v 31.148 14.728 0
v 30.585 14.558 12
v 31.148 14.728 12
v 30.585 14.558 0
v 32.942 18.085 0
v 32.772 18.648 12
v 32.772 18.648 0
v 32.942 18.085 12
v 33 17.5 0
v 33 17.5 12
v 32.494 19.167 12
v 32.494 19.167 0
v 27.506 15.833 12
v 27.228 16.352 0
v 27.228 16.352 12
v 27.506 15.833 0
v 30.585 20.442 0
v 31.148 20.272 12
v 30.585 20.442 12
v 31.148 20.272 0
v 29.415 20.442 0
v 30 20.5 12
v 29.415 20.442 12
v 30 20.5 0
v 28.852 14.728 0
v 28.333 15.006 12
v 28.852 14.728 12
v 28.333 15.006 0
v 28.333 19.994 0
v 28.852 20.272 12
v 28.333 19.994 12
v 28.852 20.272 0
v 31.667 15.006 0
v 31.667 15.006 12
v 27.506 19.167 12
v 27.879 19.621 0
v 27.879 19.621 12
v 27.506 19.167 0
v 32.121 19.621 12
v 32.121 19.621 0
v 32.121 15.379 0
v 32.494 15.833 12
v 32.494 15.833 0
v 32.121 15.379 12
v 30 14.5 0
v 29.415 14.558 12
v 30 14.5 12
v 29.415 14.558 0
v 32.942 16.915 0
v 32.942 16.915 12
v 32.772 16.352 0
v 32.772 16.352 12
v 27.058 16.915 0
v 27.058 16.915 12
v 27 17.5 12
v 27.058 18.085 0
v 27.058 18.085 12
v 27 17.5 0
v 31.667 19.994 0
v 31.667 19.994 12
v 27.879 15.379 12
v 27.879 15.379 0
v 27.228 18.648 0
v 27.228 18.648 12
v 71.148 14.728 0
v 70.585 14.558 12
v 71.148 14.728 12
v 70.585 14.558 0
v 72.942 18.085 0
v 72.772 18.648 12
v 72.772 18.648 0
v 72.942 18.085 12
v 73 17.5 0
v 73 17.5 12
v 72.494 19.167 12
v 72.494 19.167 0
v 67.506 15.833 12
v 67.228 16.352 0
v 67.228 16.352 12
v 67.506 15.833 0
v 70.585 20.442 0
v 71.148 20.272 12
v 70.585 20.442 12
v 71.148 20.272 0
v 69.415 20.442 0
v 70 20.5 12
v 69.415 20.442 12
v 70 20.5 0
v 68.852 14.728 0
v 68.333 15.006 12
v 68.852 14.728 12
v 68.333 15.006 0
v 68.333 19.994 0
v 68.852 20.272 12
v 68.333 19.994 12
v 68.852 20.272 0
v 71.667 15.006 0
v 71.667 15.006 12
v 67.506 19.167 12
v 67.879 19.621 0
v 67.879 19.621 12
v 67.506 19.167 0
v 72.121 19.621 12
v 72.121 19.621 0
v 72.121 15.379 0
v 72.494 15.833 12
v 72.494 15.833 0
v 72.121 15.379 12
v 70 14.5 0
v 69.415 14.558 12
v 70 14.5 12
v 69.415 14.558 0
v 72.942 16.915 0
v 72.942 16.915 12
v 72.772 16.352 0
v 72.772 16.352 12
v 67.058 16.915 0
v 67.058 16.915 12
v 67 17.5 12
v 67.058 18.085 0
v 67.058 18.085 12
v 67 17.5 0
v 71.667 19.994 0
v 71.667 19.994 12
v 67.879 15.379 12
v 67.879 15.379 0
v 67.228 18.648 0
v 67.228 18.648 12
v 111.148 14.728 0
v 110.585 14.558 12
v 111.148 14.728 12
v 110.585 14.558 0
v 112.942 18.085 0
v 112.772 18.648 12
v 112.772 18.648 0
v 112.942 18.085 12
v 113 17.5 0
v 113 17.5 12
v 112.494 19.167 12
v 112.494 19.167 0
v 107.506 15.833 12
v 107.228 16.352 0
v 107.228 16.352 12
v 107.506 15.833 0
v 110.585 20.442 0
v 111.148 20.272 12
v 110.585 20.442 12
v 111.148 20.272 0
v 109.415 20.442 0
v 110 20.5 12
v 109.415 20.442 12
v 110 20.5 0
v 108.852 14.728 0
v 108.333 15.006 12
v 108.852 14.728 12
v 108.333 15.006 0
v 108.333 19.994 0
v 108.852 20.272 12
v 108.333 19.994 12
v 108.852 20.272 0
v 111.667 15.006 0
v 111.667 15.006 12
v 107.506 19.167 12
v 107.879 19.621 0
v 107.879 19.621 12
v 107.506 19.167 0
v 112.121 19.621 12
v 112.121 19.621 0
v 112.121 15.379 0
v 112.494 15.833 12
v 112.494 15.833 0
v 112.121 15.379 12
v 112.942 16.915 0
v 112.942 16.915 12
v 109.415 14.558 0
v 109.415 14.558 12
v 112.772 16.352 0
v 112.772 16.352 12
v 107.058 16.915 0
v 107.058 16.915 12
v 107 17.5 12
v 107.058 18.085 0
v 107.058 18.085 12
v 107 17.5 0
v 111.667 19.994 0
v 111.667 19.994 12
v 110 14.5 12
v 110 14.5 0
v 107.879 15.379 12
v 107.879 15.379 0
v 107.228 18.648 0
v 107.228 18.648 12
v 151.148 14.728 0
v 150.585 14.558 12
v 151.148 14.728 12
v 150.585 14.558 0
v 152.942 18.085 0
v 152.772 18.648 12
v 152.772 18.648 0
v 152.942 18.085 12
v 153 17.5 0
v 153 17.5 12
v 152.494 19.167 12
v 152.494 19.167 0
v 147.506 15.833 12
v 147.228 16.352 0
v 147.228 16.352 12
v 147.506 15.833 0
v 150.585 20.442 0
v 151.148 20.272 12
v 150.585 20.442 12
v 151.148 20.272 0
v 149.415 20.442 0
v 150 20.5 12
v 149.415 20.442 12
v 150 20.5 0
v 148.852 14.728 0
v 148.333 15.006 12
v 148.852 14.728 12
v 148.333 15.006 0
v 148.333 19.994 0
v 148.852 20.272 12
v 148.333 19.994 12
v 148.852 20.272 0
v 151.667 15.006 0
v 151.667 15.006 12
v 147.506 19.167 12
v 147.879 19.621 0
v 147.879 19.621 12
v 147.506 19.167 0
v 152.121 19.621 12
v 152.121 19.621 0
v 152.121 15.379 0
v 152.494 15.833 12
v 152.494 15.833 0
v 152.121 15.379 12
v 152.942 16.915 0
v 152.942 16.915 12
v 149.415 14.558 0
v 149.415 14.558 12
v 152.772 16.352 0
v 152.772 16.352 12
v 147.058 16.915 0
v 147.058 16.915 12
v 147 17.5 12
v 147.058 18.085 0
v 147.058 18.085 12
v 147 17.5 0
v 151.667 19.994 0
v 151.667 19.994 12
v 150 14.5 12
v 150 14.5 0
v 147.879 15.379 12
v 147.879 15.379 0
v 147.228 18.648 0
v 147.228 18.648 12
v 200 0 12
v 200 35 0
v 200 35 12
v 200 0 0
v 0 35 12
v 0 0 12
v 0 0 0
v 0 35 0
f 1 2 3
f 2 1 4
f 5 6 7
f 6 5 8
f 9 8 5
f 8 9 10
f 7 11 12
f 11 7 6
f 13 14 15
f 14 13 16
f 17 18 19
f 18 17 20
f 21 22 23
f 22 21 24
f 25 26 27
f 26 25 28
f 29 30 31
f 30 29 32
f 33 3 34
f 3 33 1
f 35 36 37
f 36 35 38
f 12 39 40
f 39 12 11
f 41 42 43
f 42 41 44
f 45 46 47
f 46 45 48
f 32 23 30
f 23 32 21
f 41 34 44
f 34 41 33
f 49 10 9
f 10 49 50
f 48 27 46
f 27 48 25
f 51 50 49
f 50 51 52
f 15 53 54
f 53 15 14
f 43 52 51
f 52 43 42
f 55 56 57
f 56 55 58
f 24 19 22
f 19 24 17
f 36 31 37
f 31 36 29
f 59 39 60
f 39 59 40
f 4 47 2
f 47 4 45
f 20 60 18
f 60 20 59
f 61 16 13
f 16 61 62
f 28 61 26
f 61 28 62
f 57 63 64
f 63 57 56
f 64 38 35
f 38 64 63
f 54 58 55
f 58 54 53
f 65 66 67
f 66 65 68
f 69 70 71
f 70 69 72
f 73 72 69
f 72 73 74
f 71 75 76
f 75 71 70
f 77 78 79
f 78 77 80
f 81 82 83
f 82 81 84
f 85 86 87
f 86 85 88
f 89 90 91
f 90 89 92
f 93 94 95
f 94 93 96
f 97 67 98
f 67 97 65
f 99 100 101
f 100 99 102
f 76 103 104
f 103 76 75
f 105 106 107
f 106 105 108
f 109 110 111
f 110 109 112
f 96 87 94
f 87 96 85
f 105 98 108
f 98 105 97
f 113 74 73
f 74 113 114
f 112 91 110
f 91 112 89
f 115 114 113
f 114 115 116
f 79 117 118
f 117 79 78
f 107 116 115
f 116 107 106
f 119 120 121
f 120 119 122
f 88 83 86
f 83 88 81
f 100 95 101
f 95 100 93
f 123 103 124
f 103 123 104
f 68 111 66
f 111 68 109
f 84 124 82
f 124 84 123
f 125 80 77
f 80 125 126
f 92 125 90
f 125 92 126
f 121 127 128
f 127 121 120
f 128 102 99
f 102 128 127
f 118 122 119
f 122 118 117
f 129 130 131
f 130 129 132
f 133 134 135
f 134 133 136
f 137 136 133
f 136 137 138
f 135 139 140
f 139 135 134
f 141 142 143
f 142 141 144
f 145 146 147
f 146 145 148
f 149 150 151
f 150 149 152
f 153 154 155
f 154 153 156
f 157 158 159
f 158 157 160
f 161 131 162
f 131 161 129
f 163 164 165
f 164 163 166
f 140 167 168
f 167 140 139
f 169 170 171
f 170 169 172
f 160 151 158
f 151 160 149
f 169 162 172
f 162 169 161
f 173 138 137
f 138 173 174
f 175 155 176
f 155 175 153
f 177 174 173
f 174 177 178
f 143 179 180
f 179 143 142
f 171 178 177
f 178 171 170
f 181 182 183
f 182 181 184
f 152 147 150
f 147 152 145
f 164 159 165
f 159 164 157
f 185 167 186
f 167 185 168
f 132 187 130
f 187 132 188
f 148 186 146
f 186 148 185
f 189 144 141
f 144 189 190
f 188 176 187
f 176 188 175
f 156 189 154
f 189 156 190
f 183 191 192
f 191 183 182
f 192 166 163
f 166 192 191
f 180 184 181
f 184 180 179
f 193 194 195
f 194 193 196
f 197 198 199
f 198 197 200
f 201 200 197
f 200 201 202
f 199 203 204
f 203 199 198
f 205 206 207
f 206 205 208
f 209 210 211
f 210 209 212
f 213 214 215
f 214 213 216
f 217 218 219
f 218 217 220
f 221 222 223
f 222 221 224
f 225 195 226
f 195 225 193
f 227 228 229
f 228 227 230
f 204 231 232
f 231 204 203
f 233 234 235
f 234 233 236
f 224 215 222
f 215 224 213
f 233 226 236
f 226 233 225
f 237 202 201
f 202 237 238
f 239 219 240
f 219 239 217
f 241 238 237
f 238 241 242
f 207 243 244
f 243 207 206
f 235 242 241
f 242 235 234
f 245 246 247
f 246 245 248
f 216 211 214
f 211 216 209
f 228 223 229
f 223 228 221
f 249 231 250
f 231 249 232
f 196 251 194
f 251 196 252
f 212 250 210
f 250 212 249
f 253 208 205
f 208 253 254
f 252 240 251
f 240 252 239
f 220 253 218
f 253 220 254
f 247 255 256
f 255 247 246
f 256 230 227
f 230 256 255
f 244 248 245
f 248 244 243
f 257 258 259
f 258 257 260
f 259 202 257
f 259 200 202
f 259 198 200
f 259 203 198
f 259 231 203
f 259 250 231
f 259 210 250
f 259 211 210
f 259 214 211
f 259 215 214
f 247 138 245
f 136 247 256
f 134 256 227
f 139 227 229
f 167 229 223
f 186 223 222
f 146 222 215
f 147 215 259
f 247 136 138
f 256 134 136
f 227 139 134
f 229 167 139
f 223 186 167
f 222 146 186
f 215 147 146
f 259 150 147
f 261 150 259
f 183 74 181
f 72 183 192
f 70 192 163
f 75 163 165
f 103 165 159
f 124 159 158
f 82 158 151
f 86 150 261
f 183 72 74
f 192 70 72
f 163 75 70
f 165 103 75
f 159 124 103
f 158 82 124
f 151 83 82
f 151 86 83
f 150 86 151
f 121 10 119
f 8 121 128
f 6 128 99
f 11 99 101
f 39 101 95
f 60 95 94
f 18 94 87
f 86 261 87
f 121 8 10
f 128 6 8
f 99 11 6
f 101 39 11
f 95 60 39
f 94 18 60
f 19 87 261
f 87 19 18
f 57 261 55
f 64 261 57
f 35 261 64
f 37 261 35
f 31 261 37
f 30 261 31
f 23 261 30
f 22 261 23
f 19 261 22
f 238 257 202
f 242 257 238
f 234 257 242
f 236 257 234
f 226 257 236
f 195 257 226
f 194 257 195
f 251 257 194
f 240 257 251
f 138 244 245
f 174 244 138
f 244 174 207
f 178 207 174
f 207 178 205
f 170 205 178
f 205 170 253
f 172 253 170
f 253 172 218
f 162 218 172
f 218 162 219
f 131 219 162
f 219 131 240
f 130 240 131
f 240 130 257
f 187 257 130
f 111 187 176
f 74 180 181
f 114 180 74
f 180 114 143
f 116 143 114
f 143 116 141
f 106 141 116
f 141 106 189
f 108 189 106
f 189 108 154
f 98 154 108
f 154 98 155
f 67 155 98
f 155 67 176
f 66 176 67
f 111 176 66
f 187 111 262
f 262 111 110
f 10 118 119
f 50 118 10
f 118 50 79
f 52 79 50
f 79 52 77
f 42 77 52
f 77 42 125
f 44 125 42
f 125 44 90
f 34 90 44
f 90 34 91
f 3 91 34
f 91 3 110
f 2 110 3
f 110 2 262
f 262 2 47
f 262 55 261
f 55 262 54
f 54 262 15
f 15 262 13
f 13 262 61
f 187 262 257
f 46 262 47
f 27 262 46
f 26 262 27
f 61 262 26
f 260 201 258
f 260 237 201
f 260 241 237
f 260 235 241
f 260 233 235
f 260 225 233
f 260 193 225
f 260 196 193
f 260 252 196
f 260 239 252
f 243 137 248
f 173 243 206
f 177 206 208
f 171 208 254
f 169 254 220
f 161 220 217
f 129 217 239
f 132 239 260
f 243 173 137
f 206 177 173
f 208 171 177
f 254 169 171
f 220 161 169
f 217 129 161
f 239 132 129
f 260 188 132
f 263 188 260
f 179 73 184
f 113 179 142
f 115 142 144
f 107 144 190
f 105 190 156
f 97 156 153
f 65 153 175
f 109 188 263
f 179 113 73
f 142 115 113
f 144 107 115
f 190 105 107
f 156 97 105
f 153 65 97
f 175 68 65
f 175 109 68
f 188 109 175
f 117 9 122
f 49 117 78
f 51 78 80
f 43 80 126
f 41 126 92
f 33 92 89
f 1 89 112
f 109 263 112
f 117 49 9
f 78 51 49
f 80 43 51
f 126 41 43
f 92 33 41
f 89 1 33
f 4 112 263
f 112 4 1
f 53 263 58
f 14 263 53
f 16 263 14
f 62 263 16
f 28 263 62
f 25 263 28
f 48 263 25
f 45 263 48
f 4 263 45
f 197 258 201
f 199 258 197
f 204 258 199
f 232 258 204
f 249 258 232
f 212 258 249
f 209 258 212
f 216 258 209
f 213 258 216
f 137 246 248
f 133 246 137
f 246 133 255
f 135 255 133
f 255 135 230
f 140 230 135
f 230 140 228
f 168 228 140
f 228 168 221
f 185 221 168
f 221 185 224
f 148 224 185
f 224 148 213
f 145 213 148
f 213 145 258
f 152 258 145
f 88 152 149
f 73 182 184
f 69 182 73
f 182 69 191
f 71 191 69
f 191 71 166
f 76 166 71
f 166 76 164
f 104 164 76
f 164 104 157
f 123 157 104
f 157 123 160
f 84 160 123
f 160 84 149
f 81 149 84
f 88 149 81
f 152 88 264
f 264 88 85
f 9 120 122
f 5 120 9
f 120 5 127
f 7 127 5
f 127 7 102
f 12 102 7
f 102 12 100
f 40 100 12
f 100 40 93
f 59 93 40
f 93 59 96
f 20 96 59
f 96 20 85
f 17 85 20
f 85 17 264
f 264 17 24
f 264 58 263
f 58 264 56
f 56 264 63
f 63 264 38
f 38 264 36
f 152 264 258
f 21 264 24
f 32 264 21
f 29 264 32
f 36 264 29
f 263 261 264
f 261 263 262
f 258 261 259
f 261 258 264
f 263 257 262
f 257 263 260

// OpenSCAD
$fn = 32;

// ----------------------------------------------------------------------
// Long rail: 200-250 mm mounting rail
// ----------------------------------------------------------------------

// --- parameters (mm) ---
rail_l = 200;             // rail length, X
rail_w = 35;              // rail width, Y
rail_t = 12;              // rail thickness, Z
hole_d = 6;               // mounting hole diameter
hole_start = 30;          // first hole offset from the end
hole_pitch = 40;          // hole pitch
holes = 4;                // number of holes

difference() {
  cube([rail_l, rail_w, rail_t]);
  for (i = [0 : holes - 1])
    translate([hole_start + i * hole_pitch, rail_w / 2, -1])
      cylinder(h = rail_t + 2, d = hole_d);
}
